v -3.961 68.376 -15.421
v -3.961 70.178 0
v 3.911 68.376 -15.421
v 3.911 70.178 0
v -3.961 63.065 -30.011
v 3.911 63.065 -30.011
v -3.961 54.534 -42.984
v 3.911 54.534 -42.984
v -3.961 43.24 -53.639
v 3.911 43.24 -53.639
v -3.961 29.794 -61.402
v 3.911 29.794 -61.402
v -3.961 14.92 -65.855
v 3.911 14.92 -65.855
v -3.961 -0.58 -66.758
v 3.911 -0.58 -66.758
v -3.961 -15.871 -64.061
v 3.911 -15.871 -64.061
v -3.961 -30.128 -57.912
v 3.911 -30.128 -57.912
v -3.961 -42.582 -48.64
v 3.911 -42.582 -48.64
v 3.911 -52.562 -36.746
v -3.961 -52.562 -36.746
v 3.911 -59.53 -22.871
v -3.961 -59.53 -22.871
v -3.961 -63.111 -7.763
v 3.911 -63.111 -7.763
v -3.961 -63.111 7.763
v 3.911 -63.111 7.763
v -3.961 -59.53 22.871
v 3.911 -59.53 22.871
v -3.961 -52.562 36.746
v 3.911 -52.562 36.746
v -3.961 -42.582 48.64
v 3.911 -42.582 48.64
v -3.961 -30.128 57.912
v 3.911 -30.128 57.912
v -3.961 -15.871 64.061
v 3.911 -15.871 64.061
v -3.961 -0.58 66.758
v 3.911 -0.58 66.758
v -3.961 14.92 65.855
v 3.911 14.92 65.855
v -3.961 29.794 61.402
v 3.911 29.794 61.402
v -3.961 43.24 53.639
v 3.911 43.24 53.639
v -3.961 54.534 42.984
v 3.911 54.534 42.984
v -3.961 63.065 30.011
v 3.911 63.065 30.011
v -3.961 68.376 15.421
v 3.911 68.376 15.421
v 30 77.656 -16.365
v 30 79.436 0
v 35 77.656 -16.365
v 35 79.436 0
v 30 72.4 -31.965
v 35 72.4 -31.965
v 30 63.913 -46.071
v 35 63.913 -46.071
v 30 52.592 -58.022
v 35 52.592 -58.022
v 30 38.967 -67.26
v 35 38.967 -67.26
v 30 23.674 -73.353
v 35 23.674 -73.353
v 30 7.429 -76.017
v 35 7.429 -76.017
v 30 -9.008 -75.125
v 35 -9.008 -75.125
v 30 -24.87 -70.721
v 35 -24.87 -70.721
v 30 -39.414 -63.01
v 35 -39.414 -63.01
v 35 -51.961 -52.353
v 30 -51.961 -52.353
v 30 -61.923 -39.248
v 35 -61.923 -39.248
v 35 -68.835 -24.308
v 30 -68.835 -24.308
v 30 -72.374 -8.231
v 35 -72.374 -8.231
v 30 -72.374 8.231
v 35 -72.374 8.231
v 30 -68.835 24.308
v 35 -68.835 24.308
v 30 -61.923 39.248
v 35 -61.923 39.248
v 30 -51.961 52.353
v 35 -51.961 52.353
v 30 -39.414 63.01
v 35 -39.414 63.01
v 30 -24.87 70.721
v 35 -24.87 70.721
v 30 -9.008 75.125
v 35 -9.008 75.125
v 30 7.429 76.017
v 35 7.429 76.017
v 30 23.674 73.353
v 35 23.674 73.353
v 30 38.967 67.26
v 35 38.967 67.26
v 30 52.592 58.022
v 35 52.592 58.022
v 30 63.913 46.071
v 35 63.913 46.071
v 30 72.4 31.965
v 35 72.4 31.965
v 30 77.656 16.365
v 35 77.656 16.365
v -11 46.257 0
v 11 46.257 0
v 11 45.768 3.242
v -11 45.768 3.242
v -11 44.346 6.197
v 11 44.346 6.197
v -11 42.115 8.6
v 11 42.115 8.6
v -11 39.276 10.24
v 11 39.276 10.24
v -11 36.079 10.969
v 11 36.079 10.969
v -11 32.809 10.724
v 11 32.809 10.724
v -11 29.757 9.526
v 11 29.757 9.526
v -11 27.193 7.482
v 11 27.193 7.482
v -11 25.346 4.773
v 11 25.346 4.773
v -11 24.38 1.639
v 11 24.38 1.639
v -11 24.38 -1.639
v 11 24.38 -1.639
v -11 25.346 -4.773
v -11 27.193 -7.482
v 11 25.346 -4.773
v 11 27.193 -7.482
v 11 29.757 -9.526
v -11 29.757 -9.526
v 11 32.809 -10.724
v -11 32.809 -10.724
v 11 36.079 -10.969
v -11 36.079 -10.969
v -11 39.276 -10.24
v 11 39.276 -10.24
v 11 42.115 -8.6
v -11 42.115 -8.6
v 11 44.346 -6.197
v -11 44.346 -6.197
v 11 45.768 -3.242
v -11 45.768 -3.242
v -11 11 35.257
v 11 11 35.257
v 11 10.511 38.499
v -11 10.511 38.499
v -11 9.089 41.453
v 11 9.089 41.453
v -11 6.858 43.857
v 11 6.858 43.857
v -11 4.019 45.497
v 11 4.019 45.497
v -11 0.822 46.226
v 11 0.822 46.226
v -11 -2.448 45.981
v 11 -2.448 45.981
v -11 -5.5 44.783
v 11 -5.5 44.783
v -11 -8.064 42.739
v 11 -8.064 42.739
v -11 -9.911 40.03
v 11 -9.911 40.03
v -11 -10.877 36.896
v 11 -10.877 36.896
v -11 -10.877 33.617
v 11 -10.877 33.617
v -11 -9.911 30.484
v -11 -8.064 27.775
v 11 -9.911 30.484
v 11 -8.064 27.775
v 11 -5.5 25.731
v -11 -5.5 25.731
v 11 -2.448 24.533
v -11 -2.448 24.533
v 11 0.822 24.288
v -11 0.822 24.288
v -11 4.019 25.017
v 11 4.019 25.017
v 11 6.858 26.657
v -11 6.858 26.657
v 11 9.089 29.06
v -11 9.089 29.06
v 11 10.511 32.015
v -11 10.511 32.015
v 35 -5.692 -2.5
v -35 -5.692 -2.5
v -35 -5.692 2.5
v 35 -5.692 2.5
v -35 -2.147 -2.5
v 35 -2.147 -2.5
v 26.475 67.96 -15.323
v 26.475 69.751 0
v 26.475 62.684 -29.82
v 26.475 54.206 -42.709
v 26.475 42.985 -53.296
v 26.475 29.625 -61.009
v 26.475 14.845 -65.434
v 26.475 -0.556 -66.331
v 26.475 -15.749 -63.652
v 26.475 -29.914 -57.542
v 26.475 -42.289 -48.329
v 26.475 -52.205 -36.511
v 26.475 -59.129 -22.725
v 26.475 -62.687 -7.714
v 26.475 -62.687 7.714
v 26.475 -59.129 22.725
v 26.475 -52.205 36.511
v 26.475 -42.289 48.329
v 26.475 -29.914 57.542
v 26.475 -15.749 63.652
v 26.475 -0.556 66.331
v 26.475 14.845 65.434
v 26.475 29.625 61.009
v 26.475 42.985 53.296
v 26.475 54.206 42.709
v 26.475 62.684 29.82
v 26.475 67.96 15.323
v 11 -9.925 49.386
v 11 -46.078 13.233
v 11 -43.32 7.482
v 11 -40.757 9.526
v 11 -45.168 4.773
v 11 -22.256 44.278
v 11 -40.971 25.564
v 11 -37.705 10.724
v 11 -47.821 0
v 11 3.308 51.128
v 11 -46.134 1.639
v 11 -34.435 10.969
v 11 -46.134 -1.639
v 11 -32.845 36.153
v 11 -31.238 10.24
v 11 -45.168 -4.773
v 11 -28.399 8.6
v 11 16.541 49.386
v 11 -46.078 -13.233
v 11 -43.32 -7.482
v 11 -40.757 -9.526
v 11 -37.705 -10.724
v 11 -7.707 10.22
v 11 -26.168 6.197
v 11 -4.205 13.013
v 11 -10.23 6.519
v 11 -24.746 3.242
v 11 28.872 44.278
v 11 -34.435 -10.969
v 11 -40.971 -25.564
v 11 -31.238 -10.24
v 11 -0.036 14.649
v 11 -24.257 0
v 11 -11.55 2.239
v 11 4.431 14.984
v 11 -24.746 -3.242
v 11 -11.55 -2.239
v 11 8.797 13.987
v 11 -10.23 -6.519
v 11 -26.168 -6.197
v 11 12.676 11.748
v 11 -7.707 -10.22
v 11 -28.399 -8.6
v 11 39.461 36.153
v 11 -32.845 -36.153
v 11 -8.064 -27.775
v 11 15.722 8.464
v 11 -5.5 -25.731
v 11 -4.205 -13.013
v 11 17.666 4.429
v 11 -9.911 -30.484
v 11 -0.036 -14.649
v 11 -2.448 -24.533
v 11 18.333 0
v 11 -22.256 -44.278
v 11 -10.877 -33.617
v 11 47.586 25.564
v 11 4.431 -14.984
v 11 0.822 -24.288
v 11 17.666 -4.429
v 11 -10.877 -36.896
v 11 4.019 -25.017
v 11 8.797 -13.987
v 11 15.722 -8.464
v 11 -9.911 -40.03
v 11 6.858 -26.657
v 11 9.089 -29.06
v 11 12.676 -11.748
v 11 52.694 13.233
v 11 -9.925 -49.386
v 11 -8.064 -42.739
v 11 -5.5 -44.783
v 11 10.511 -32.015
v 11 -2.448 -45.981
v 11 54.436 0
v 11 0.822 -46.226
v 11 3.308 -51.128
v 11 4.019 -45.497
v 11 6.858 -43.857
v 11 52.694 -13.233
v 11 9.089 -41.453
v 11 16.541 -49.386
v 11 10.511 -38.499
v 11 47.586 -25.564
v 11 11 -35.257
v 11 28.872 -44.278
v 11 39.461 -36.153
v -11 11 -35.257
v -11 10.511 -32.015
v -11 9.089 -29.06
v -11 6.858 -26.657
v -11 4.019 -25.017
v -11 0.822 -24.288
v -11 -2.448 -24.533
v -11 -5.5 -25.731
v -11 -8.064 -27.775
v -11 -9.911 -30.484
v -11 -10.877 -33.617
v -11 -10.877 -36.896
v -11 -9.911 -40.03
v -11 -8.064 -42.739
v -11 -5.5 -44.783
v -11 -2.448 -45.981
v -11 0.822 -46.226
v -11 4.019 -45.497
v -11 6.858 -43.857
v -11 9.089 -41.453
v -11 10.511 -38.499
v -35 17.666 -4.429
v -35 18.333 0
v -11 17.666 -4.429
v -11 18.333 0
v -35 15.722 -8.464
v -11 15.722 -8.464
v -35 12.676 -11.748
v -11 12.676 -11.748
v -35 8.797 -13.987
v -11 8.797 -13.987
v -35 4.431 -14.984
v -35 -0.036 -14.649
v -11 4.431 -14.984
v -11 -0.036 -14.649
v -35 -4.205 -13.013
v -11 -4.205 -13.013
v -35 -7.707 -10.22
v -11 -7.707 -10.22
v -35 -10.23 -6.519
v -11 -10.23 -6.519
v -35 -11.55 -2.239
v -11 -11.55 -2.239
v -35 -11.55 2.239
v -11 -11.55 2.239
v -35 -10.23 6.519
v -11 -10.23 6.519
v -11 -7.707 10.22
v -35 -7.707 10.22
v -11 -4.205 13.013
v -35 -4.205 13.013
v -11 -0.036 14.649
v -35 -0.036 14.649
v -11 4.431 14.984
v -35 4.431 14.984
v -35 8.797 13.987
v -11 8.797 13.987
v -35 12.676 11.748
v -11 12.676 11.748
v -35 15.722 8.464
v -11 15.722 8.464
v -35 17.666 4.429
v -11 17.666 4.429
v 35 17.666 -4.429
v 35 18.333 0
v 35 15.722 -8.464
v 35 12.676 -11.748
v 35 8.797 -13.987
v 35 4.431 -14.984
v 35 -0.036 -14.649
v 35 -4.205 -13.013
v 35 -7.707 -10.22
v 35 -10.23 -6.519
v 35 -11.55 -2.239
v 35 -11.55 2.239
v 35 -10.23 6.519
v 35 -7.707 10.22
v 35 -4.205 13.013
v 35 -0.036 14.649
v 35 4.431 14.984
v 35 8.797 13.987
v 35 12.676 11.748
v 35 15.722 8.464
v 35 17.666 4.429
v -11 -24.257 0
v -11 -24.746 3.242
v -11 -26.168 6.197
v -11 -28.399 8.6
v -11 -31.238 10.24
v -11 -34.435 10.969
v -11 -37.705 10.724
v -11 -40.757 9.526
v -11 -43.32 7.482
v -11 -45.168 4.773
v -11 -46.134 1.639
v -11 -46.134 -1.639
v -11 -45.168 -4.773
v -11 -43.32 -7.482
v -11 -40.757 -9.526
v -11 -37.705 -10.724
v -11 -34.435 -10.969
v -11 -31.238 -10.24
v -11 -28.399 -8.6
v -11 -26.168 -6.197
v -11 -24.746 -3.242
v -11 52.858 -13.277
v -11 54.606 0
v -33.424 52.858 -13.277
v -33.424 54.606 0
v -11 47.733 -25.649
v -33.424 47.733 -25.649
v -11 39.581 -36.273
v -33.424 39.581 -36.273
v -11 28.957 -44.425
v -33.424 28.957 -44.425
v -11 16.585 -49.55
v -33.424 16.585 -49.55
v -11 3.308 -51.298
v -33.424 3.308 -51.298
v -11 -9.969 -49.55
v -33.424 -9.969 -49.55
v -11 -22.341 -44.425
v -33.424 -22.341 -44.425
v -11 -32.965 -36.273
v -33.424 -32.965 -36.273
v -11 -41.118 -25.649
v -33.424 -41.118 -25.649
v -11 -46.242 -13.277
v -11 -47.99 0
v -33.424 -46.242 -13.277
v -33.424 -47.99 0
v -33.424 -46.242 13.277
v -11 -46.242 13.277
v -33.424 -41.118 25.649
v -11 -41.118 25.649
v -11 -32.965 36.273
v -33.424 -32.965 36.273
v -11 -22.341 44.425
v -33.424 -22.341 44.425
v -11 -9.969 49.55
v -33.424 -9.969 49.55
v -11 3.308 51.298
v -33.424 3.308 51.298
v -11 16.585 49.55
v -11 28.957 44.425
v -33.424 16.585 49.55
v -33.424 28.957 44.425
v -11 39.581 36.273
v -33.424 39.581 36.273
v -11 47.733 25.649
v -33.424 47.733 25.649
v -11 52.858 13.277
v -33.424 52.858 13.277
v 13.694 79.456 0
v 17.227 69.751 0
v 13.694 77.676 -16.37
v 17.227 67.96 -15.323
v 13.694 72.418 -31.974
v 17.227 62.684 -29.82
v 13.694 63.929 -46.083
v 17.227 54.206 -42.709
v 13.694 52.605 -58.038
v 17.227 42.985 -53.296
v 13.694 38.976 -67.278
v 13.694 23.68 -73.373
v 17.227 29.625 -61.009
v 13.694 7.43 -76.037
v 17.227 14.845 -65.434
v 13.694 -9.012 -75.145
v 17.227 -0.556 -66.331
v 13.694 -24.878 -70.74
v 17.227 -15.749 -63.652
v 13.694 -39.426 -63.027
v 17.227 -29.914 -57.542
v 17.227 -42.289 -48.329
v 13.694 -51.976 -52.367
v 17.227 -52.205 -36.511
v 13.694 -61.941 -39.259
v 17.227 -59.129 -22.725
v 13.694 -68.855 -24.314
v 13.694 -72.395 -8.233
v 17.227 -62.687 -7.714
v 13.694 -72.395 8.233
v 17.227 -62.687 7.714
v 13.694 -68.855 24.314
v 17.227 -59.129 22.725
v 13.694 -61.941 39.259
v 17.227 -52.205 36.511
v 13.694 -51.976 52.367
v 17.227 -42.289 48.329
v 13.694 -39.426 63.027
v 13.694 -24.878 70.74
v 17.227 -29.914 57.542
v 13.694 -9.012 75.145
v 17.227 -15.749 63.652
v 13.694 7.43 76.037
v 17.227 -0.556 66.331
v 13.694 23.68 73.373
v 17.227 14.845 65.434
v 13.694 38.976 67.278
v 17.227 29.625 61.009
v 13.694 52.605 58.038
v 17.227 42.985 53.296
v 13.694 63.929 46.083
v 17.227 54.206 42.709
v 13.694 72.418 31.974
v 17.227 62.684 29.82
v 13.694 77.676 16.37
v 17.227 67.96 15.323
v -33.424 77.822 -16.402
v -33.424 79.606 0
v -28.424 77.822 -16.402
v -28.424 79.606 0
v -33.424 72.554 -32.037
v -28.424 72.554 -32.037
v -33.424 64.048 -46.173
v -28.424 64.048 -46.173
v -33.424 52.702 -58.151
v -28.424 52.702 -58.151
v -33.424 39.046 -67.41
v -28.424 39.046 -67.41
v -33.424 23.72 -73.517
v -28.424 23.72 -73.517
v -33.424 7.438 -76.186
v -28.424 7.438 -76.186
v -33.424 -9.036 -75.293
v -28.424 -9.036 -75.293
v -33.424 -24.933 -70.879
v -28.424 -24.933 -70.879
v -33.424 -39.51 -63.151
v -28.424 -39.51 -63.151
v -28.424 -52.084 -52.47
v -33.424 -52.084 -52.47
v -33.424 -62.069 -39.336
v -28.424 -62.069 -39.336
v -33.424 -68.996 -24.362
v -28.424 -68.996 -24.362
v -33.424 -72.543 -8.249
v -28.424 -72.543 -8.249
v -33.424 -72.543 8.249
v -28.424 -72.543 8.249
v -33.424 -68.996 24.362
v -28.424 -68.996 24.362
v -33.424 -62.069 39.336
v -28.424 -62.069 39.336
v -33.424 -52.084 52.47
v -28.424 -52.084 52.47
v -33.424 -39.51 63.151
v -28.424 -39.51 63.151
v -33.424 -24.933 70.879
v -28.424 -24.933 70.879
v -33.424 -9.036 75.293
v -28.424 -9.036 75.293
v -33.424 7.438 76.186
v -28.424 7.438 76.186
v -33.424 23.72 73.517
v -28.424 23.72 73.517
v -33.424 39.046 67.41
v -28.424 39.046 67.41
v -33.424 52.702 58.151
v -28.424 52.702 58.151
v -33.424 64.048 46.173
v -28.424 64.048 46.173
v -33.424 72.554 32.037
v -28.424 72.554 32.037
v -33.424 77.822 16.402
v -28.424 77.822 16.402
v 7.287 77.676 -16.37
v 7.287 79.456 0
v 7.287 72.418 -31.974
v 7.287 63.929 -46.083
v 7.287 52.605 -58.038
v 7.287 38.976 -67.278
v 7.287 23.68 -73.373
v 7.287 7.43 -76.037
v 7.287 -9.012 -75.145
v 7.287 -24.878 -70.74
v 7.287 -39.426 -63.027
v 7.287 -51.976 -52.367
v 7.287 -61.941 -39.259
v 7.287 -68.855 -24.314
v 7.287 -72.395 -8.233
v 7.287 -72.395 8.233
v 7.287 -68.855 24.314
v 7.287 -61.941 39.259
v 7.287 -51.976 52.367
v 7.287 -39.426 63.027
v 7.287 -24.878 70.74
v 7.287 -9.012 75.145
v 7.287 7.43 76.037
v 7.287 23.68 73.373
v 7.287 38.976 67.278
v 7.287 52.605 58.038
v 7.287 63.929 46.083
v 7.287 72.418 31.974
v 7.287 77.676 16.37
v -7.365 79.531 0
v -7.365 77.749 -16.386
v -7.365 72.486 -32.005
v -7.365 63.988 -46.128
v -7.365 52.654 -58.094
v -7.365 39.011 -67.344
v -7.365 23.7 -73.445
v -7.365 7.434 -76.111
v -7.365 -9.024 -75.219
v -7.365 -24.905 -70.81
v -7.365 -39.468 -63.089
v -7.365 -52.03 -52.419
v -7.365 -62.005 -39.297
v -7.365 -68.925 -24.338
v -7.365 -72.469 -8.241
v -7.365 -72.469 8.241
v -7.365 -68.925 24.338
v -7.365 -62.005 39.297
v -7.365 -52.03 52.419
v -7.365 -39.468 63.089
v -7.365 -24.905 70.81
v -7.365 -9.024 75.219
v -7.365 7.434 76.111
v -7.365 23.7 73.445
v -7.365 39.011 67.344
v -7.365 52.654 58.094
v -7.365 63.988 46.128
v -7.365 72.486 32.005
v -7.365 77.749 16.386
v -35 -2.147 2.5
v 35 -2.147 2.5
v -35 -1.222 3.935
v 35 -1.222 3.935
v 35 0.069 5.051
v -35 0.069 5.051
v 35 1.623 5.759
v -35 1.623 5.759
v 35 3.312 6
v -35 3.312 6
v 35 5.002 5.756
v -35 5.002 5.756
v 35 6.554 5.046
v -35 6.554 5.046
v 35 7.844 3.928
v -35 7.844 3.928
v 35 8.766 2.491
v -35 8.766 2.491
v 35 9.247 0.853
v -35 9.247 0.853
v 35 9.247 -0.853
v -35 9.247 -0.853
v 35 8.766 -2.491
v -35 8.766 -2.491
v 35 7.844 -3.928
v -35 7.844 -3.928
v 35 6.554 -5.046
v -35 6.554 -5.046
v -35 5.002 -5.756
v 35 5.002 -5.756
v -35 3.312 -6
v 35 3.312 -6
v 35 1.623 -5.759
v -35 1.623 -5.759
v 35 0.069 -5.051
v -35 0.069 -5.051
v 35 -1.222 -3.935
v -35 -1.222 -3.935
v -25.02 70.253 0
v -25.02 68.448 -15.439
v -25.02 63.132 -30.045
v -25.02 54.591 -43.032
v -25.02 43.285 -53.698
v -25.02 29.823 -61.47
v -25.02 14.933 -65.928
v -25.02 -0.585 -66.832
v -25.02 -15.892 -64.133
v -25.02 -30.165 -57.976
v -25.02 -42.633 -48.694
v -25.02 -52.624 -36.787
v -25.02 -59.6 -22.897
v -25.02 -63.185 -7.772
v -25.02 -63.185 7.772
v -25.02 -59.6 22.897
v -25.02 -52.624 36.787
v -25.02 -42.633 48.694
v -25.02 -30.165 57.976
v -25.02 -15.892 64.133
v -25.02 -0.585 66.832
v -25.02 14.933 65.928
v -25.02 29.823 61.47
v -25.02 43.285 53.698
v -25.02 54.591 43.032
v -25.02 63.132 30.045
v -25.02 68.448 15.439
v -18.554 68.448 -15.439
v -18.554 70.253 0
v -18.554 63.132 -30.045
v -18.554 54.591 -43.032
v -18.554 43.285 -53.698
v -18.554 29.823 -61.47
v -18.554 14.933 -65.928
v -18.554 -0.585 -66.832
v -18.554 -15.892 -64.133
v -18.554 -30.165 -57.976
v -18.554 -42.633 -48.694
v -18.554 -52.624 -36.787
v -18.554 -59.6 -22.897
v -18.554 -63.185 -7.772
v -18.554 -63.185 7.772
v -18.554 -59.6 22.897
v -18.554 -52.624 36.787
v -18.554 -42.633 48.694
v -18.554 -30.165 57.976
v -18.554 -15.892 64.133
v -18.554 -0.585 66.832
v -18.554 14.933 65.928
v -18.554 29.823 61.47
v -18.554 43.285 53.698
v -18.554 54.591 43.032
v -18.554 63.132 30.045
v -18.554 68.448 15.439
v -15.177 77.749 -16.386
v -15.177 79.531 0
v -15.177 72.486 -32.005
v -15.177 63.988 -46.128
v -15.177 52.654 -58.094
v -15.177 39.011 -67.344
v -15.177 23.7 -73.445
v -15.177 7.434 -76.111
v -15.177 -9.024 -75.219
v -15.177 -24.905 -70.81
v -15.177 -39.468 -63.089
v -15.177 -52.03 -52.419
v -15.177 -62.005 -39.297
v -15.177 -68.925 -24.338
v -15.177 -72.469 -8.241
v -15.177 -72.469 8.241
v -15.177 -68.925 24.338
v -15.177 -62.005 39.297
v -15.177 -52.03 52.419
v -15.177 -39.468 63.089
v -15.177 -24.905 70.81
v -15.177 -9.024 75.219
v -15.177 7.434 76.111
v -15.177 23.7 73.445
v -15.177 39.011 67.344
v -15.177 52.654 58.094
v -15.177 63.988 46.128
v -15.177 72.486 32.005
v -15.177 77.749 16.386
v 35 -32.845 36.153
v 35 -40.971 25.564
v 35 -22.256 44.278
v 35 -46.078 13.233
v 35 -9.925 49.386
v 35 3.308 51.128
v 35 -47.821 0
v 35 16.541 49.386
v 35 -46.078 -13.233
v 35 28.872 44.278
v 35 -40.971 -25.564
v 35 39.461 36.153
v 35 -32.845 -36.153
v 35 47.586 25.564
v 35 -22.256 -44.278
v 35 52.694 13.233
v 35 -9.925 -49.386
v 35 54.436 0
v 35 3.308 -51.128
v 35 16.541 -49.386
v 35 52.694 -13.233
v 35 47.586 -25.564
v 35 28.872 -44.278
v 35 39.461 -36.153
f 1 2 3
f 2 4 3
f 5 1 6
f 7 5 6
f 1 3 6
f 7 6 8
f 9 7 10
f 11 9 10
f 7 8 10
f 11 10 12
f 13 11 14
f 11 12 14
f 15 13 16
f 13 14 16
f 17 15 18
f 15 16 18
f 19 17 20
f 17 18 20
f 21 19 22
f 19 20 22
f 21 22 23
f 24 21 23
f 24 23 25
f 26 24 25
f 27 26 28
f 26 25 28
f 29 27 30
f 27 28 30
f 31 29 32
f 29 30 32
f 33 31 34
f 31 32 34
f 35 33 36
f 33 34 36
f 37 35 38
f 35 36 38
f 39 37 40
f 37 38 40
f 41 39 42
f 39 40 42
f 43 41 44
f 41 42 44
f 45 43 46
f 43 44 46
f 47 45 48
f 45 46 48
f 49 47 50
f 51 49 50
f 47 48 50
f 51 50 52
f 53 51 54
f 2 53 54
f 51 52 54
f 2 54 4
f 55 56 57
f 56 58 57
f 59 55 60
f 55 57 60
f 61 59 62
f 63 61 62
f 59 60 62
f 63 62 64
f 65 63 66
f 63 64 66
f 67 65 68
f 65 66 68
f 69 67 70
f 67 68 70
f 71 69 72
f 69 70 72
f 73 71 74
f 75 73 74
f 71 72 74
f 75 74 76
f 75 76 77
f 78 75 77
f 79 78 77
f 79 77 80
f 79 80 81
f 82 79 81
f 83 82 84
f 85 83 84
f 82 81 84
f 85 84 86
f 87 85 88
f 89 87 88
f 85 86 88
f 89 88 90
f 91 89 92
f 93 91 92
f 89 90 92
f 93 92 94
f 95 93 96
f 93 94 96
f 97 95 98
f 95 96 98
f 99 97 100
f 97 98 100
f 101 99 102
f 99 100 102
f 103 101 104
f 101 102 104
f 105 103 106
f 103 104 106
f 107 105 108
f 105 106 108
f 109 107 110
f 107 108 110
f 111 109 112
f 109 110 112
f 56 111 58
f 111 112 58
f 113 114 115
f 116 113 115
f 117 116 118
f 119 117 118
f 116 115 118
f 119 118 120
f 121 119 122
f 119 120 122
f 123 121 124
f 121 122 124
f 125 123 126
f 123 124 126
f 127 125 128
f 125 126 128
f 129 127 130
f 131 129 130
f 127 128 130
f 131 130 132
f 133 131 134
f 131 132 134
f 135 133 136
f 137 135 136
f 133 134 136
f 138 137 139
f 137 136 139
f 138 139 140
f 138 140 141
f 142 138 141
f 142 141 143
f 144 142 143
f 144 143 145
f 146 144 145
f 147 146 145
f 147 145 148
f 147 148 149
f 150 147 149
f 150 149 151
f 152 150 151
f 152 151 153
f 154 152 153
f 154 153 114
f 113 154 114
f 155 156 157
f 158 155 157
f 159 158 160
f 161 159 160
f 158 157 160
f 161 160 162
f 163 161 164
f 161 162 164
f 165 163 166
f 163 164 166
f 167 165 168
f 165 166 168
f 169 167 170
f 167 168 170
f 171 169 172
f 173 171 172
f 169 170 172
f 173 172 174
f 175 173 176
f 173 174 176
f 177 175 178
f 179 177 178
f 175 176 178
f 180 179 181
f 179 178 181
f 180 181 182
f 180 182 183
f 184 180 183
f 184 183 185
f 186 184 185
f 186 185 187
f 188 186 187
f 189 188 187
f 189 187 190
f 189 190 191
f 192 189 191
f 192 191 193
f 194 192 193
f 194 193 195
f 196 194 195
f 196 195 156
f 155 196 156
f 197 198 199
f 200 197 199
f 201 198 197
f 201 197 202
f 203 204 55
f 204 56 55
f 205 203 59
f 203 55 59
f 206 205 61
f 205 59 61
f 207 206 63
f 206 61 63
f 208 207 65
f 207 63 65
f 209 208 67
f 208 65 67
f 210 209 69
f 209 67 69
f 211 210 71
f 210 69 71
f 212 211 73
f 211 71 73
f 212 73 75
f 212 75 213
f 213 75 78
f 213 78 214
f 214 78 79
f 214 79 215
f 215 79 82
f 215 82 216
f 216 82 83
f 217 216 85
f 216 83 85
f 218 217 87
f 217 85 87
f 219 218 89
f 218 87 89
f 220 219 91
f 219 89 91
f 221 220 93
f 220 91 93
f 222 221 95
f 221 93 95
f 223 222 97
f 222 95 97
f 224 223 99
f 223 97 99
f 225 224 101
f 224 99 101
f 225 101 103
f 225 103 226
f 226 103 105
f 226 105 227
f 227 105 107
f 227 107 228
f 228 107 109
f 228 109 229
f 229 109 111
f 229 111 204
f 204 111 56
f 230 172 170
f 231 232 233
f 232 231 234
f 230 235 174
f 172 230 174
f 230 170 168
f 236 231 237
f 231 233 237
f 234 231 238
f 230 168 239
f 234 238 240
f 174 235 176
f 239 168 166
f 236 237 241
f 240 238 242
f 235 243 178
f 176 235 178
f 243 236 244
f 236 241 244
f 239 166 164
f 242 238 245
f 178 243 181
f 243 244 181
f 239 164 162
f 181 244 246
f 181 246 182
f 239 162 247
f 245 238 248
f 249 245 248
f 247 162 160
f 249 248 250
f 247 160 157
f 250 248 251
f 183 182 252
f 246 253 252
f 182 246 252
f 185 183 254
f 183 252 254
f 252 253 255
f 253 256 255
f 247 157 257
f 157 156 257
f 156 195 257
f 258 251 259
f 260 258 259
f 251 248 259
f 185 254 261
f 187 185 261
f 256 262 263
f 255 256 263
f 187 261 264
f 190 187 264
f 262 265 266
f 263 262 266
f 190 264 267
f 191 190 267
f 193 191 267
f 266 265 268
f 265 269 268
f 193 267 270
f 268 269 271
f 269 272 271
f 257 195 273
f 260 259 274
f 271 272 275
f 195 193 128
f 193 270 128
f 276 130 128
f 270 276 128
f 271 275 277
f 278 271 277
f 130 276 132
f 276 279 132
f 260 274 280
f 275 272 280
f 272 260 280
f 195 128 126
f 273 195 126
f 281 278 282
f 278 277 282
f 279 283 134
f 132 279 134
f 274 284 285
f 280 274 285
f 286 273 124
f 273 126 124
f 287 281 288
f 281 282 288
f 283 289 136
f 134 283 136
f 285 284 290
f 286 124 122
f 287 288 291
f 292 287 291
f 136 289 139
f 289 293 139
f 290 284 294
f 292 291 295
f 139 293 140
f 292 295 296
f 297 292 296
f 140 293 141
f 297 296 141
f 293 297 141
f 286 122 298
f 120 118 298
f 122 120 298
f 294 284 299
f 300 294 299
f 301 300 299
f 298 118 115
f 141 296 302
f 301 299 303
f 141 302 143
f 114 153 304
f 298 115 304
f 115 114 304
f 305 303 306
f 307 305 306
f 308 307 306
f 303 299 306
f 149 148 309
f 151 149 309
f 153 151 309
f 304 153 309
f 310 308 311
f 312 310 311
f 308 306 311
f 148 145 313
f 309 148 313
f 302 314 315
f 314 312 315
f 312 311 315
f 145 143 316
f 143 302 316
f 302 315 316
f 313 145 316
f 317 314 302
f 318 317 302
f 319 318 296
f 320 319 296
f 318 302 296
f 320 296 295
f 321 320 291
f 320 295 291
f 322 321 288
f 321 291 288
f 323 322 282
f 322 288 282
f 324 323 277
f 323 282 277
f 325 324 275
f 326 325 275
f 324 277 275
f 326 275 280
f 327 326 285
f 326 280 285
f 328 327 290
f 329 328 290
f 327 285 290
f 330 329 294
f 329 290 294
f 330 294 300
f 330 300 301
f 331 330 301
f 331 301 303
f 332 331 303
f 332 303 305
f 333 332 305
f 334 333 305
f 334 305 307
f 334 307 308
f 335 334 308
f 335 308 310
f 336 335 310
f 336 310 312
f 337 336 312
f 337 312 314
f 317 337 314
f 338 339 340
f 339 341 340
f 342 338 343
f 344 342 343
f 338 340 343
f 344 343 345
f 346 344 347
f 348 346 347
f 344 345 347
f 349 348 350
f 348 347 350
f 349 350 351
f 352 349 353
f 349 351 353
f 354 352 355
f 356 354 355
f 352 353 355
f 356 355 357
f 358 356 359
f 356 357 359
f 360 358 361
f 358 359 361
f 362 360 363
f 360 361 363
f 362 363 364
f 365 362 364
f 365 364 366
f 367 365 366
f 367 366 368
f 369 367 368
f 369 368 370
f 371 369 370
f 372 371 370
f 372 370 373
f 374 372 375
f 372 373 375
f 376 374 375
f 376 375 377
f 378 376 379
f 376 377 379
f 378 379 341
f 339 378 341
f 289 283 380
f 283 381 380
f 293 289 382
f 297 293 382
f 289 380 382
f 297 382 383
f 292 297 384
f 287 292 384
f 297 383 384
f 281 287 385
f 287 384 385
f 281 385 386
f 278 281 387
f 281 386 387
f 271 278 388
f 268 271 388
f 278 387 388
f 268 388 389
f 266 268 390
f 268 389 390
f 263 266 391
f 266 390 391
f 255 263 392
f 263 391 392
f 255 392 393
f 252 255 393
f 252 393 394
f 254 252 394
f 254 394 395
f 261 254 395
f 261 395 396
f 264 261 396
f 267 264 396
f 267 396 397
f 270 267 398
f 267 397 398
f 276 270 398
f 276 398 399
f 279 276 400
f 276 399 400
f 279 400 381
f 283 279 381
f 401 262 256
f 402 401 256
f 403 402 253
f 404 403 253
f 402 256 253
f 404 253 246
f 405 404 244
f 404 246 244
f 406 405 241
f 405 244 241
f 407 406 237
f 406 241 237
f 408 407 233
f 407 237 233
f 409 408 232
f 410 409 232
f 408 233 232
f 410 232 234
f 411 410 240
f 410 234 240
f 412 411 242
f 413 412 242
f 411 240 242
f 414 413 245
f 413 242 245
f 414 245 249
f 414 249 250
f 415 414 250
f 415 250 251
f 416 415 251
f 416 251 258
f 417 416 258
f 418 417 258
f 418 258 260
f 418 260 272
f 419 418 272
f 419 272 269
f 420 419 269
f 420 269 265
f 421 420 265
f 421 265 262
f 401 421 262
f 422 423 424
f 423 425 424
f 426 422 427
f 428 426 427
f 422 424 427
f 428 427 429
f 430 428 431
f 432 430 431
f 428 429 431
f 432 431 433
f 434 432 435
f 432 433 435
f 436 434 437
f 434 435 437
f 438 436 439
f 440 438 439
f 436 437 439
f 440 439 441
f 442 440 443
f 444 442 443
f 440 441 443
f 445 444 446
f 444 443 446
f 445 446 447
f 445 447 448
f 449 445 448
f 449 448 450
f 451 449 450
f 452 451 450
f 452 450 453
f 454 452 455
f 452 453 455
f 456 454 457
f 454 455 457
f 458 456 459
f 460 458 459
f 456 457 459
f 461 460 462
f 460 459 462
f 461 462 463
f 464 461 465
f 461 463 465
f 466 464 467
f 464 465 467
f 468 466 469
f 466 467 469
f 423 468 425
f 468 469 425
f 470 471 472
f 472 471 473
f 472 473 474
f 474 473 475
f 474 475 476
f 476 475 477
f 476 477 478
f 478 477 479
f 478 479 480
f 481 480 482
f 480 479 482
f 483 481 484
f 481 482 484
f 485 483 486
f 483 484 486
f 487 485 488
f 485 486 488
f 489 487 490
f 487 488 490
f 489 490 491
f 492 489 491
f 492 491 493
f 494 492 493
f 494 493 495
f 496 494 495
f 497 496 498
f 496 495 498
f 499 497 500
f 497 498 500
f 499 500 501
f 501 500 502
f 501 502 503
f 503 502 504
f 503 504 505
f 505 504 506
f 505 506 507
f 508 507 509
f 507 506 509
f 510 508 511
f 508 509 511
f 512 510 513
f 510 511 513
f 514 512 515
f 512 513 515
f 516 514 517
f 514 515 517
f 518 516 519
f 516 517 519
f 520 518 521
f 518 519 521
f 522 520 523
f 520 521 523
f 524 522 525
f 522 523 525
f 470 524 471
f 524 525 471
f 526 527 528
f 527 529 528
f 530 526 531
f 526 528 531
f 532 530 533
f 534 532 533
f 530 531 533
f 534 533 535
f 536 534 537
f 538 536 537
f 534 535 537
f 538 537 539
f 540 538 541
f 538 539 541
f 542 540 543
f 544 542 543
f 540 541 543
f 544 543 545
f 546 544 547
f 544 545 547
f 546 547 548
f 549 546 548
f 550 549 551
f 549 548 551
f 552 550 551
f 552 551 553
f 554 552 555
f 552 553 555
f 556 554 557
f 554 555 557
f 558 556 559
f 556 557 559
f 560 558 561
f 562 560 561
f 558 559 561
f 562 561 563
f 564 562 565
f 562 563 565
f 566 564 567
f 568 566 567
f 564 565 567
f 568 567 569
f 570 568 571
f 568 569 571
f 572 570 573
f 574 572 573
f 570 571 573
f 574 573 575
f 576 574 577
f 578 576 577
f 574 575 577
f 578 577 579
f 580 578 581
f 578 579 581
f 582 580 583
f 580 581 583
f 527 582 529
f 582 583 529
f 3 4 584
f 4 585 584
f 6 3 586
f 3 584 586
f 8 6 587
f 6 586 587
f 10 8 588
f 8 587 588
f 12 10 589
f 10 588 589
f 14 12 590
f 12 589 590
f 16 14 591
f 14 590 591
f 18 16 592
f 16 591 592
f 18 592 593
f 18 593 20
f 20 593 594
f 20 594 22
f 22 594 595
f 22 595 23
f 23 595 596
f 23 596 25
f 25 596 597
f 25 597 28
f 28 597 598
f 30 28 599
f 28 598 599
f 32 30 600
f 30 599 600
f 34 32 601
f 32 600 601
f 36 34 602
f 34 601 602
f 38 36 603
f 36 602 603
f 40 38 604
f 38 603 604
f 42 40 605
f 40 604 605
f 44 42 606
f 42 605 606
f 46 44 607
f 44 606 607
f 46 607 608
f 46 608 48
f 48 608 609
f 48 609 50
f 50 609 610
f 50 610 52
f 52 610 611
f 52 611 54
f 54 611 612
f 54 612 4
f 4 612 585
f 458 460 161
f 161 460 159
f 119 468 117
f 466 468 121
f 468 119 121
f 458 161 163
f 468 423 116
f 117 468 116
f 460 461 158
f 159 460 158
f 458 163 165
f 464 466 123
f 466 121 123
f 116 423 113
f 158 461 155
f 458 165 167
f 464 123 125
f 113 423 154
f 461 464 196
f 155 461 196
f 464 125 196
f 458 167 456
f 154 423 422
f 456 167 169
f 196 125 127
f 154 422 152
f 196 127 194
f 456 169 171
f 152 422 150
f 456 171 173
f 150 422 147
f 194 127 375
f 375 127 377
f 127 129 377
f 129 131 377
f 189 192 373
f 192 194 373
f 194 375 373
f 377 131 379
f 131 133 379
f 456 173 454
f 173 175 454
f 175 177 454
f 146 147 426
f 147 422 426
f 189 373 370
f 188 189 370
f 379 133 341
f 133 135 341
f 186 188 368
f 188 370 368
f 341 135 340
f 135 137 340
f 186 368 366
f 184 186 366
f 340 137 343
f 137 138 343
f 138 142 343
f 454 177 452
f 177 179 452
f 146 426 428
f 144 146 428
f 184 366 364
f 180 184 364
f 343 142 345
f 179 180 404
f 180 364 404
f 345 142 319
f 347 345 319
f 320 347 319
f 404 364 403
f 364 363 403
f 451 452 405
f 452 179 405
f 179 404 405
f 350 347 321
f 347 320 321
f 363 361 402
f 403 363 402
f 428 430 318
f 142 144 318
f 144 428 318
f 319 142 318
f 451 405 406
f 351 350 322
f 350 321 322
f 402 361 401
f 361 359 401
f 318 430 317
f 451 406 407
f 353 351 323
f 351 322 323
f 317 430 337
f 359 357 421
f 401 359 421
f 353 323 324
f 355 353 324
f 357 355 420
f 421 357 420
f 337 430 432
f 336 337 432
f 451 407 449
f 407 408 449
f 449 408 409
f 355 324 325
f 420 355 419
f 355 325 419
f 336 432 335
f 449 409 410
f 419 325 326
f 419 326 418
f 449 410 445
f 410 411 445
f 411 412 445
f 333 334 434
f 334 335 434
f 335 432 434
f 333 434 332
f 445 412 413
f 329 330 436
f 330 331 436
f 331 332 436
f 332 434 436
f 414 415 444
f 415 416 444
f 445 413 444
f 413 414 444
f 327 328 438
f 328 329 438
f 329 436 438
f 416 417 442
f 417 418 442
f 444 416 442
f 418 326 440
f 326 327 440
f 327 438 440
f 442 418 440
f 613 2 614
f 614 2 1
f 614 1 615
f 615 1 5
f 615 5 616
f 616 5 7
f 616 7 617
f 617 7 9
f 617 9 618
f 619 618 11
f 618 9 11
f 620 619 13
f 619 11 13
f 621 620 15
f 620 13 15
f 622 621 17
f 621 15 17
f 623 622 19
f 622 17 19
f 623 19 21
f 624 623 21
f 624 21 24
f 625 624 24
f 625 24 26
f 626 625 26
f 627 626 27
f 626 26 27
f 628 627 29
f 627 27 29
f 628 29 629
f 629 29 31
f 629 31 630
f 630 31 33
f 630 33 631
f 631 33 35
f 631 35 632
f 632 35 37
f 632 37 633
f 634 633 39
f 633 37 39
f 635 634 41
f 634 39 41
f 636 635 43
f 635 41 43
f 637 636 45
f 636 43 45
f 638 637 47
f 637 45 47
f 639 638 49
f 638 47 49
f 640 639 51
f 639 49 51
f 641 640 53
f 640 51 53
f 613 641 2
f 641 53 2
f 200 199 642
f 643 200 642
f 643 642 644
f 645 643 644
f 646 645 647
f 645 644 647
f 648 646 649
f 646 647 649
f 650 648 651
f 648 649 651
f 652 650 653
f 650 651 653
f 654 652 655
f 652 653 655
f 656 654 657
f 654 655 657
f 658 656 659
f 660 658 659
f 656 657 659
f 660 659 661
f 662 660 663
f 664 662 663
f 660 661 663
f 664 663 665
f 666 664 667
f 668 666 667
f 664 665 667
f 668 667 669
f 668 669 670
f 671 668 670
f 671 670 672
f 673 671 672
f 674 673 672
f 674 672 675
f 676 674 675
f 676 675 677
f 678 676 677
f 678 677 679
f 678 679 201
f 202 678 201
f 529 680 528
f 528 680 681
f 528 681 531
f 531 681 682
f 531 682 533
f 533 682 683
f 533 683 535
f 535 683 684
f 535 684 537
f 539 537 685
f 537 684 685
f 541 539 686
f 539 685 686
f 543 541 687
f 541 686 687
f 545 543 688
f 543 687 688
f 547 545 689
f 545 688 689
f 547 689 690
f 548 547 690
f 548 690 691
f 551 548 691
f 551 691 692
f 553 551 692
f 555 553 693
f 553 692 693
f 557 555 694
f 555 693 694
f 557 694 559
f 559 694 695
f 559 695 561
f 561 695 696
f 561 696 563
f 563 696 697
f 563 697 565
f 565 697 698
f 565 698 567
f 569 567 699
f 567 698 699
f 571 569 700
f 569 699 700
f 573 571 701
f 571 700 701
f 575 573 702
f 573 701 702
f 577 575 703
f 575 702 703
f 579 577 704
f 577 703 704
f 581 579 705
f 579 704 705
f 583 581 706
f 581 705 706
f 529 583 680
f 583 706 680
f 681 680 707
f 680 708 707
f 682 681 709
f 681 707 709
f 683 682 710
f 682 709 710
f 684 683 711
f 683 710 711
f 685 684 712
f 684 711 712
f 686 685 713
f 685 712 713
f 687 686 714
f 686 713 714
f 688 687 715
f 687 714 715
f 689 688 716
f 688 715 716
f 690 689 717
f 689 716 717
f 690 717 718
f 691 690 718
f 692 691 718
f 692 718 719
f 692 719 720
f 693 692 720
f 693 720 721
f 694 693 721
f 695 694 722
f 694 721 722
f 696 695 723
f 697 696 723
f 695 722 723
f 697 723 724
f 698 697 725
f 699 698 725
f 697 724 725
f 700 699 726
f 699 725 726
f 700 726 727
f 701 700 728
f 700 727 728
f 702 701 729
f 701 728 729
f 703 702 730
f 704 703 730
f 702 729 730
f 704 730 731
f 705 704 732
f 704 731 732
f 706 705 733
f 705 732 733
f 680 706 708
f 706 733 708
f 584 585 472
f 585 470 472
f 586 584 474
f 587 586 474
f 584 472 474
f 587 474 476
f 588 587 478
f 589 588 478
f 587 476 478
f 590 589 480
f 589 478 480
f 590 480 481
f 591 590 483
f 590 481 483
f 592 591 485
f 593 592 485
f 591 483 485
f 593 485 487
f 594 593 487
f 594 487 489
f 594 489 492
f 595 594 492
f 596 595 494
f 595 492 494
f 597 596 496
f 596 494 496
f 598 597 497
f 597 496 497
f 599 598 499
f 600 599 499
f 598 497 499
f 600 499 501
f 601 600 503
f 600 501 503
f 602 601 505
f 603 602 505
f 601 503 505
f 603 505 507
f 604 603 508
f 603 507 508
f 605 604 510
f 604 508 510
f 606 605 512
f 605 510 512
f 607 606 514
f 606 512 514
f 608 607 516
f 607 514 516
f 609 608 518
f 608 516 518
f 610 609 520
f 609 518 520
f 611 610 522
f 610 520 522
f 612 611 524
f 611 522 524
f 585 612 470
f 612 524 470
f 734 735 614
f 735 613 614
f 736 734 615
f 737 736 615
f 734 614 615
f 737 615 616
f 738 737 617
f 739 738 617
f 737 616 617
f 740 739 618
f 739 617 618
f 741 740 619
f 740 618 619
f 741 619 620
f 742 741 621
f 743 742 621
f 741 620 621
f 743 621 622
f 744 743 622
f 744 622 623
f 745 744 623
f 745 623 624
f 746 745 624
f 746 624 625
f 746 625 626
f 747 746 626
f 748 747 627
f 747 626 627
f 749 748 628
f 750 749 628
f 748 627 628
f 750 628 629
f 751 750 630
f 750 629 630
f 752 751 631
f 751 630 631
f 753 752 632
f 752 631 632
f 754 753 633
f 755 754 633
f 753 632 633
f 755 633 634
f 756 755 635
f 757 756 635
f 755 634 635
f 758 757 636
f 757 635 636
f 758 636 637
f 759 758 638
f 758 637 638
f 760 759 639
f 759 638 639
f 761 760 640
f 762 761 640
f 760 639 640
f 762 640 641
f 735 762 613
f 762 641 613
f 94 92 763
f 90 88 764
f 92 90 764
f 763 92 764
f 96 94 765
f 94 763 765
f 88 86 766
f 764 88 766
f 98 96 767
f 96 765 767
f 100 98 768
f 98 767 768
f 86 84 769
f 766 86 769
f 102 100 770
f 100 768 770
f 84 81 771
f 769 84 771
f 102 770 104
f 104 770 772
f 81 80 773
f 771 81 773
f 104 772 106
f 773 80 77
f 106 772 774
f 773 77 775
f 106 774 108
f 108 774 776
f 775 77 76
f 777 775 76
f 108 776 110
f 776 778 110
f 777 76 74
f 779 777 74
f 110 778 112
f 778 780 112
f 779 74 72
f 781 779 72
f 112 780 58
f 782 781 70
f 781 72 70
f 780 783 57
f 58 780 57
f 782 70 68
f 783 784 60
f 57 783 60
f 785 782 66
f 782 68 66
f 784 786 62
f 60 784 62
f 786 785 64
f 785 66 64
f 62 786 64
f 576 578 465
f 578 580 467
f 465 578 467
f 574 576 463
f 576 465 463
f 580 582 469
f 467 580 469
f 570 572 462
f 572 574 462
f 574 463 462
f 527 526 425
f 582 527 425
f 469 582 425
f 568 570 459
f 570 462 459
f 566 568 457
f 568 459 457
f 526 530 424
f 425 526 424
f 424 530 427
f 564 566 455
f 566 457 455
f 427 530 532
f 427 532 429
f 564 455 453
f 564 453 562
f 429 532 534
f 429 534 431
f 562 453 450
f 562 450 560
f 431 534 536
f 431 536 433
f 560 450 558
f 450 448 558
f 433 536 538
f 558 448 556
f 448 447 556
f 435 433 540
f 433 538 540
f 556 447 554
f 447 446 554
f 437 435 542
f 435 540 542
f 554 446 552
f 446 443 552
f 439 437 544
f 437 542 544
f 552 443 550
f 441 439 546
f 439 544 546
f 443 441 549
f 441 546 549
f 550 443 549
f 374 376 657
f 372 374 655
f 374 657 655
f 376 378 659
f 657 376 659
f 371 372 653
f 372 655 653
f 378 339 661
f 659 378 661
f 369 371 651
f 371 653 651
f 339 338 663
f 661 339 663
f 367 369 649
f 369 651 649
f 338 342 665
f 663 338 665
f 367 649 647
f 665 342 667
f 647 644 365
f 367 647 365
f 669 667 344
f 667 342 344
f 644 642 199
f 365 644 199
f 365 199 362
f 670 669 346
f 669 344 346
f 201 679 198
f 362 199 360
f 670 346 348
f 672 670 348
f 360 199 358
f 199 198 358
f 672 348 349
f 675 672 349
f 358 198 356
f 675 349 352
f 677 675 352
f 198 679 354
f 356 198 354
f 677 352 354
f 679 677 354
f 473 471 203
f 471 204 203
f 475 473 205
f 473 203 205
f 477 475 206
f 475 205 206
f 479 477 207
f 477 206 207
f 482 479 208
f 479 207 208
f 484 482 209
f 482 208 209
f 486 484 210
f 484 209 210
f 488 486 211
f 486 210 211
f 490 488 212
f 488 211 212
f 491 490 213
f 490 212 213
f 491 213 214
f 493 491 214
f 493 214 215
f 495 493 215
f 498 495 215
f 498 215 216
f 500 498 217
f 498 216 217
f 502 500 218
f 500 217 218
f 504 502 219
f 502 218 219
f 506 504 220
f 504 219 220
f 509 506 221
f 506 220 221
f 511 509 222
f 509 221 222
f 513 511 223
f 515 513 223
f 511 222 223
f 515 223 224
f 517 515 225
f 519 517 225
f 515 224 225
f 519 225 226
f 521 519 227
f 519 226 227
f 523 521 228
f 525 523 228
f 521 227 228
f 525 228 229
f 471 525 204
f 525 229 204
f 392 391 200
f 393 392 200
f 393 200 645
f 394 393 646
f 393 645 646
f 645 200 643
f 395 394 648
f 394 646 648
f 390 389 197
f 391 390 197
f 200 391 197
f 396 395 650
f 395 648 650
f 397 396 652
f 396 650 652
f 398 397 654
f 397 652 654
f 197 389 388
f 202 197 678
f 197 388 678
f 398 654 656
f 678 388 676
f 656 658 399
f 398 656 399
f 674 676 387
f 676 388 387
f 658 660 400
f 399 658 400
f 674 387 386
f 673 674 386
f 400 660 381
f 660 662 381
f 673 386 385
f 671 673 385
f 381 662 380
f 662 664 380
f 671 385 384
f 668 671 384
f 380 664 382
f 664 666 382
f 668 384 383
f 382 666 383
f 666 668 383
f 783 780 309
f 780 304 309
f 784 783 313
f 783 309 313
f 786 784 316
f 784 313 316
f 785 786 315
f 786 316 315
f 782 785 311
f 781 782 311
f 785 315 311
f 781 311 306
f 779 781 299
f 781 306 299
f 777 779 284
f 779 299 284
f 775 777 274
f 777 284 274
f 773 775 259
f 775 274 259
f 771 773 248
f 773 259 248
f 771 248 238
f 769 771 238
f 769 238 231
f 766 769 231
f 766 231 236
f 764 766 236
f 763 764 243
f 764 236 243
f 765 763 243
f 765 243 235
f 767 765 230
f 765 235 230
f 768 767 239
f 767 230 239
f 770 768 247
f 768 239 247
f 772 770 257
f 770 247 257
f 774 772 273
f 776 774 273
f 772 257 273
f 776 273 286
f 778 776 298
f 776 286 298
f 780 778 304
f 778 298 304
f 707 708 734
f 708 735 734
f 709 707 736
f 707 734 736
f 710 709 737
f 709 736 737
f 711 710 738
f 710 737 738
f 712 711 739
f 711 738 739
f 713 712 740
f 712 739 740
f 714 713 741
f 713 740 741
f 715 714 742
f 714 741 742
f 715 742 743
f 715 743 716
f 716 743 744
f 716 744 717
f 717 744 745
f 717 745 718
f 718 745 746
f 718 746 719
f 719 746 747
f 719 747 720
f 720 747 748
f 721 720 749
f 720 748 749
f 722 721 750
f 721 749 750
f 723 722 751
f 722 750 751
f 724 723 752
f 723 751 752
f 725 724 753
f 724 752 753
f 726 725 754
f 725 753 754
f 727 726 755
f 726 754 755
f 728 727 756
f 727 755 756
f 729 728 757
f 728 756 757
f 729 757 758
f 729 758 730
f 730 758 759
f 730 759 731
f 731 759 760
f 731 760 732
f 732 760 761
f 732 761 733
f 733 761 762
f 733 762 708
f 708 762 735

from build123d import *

# Parameters (mm, degrees)
SKETCH2_R          = 11
CUT_EXTRUDE1_DEPTH = 120.475538825
SKETCH3_W          = 5
SKETCH3_H          = 6
CUT_EXTRUDE2_DEPTH = 131.607826632


with BuildPart() as part:
    # Sketch1 → Revolve3 (revolve)
    with BuildSketch(Plane.XY):
        Polygon((35, 79.435897436), (35, 54.435897436), (11, 54.435897436), (11, 18.333333333), (35, 18.333333333), (35, 9.307692308), (-35, 9.307692308), (-35, 18.333333333), (-11, 18.333333333), (-11, 54.605542618), (-33.423992019, 54.605542618), (-33.423992019, 79.605542618), (-28.423992019, 79.605542618), (-25.019939293, 70.252984619), (-18.554189686, 70.252984619), (-15.177301066, 79.530909851), (-7.364883216, 79.530909851), (-3.96083049, 70.178351852), (3.910516857, 70.178351852), (7.287405478, 79.456277085), (13.694225587, 79.456277085), (17.226586544, 69.751195119), (26.475056629, 69.751195119), (30, 79.435897436), align=None)
    revolve(axis=Axis((74.179487179, 3.307692308, 0), (-1, 0, 0)))

    # Sketch2 → Cut-Extrude1 (cut, through all)
    with BuildSketch(Plane(origin=(11, 0, 0), x_dir=(0, 0, -1), z_dir=(1, 0, 0))):
        with Locations(Location((0, 35.256915145, 0), (0, 0, 90))):
            Circle(SKETCH2_R)
        with Locations(Location((35.256915145, 0, 0), (0, 0, 90))):
            Circle(SKETCH2_R)
        with Locations(Location((0, -35.256915145, 0), (0, 0, 90))):
            Circle(SKETCH2_R)
        with Locations(Location((-35.256915145, 0, 0), (0, 0, 90))):
            Circle(SKETCH2_R)
    extrude(amount=-CUT_EXTRUDE1_DEPTH, mode=Mode.SUBTRACT)

    # Sketch3 → Cut-Extrude2 (cut, through all)
    with BuildSketch(Plane.ZY.offset(35)):
        with Locations((0, -2.692307692)):
            Rectangle(SKETCH3_W, SKETCH3_H)
    extrude(amount=-CUT_EXTRUDE2_DEPTH, mode=Mode.SUBTRACT)


solid = part.part
